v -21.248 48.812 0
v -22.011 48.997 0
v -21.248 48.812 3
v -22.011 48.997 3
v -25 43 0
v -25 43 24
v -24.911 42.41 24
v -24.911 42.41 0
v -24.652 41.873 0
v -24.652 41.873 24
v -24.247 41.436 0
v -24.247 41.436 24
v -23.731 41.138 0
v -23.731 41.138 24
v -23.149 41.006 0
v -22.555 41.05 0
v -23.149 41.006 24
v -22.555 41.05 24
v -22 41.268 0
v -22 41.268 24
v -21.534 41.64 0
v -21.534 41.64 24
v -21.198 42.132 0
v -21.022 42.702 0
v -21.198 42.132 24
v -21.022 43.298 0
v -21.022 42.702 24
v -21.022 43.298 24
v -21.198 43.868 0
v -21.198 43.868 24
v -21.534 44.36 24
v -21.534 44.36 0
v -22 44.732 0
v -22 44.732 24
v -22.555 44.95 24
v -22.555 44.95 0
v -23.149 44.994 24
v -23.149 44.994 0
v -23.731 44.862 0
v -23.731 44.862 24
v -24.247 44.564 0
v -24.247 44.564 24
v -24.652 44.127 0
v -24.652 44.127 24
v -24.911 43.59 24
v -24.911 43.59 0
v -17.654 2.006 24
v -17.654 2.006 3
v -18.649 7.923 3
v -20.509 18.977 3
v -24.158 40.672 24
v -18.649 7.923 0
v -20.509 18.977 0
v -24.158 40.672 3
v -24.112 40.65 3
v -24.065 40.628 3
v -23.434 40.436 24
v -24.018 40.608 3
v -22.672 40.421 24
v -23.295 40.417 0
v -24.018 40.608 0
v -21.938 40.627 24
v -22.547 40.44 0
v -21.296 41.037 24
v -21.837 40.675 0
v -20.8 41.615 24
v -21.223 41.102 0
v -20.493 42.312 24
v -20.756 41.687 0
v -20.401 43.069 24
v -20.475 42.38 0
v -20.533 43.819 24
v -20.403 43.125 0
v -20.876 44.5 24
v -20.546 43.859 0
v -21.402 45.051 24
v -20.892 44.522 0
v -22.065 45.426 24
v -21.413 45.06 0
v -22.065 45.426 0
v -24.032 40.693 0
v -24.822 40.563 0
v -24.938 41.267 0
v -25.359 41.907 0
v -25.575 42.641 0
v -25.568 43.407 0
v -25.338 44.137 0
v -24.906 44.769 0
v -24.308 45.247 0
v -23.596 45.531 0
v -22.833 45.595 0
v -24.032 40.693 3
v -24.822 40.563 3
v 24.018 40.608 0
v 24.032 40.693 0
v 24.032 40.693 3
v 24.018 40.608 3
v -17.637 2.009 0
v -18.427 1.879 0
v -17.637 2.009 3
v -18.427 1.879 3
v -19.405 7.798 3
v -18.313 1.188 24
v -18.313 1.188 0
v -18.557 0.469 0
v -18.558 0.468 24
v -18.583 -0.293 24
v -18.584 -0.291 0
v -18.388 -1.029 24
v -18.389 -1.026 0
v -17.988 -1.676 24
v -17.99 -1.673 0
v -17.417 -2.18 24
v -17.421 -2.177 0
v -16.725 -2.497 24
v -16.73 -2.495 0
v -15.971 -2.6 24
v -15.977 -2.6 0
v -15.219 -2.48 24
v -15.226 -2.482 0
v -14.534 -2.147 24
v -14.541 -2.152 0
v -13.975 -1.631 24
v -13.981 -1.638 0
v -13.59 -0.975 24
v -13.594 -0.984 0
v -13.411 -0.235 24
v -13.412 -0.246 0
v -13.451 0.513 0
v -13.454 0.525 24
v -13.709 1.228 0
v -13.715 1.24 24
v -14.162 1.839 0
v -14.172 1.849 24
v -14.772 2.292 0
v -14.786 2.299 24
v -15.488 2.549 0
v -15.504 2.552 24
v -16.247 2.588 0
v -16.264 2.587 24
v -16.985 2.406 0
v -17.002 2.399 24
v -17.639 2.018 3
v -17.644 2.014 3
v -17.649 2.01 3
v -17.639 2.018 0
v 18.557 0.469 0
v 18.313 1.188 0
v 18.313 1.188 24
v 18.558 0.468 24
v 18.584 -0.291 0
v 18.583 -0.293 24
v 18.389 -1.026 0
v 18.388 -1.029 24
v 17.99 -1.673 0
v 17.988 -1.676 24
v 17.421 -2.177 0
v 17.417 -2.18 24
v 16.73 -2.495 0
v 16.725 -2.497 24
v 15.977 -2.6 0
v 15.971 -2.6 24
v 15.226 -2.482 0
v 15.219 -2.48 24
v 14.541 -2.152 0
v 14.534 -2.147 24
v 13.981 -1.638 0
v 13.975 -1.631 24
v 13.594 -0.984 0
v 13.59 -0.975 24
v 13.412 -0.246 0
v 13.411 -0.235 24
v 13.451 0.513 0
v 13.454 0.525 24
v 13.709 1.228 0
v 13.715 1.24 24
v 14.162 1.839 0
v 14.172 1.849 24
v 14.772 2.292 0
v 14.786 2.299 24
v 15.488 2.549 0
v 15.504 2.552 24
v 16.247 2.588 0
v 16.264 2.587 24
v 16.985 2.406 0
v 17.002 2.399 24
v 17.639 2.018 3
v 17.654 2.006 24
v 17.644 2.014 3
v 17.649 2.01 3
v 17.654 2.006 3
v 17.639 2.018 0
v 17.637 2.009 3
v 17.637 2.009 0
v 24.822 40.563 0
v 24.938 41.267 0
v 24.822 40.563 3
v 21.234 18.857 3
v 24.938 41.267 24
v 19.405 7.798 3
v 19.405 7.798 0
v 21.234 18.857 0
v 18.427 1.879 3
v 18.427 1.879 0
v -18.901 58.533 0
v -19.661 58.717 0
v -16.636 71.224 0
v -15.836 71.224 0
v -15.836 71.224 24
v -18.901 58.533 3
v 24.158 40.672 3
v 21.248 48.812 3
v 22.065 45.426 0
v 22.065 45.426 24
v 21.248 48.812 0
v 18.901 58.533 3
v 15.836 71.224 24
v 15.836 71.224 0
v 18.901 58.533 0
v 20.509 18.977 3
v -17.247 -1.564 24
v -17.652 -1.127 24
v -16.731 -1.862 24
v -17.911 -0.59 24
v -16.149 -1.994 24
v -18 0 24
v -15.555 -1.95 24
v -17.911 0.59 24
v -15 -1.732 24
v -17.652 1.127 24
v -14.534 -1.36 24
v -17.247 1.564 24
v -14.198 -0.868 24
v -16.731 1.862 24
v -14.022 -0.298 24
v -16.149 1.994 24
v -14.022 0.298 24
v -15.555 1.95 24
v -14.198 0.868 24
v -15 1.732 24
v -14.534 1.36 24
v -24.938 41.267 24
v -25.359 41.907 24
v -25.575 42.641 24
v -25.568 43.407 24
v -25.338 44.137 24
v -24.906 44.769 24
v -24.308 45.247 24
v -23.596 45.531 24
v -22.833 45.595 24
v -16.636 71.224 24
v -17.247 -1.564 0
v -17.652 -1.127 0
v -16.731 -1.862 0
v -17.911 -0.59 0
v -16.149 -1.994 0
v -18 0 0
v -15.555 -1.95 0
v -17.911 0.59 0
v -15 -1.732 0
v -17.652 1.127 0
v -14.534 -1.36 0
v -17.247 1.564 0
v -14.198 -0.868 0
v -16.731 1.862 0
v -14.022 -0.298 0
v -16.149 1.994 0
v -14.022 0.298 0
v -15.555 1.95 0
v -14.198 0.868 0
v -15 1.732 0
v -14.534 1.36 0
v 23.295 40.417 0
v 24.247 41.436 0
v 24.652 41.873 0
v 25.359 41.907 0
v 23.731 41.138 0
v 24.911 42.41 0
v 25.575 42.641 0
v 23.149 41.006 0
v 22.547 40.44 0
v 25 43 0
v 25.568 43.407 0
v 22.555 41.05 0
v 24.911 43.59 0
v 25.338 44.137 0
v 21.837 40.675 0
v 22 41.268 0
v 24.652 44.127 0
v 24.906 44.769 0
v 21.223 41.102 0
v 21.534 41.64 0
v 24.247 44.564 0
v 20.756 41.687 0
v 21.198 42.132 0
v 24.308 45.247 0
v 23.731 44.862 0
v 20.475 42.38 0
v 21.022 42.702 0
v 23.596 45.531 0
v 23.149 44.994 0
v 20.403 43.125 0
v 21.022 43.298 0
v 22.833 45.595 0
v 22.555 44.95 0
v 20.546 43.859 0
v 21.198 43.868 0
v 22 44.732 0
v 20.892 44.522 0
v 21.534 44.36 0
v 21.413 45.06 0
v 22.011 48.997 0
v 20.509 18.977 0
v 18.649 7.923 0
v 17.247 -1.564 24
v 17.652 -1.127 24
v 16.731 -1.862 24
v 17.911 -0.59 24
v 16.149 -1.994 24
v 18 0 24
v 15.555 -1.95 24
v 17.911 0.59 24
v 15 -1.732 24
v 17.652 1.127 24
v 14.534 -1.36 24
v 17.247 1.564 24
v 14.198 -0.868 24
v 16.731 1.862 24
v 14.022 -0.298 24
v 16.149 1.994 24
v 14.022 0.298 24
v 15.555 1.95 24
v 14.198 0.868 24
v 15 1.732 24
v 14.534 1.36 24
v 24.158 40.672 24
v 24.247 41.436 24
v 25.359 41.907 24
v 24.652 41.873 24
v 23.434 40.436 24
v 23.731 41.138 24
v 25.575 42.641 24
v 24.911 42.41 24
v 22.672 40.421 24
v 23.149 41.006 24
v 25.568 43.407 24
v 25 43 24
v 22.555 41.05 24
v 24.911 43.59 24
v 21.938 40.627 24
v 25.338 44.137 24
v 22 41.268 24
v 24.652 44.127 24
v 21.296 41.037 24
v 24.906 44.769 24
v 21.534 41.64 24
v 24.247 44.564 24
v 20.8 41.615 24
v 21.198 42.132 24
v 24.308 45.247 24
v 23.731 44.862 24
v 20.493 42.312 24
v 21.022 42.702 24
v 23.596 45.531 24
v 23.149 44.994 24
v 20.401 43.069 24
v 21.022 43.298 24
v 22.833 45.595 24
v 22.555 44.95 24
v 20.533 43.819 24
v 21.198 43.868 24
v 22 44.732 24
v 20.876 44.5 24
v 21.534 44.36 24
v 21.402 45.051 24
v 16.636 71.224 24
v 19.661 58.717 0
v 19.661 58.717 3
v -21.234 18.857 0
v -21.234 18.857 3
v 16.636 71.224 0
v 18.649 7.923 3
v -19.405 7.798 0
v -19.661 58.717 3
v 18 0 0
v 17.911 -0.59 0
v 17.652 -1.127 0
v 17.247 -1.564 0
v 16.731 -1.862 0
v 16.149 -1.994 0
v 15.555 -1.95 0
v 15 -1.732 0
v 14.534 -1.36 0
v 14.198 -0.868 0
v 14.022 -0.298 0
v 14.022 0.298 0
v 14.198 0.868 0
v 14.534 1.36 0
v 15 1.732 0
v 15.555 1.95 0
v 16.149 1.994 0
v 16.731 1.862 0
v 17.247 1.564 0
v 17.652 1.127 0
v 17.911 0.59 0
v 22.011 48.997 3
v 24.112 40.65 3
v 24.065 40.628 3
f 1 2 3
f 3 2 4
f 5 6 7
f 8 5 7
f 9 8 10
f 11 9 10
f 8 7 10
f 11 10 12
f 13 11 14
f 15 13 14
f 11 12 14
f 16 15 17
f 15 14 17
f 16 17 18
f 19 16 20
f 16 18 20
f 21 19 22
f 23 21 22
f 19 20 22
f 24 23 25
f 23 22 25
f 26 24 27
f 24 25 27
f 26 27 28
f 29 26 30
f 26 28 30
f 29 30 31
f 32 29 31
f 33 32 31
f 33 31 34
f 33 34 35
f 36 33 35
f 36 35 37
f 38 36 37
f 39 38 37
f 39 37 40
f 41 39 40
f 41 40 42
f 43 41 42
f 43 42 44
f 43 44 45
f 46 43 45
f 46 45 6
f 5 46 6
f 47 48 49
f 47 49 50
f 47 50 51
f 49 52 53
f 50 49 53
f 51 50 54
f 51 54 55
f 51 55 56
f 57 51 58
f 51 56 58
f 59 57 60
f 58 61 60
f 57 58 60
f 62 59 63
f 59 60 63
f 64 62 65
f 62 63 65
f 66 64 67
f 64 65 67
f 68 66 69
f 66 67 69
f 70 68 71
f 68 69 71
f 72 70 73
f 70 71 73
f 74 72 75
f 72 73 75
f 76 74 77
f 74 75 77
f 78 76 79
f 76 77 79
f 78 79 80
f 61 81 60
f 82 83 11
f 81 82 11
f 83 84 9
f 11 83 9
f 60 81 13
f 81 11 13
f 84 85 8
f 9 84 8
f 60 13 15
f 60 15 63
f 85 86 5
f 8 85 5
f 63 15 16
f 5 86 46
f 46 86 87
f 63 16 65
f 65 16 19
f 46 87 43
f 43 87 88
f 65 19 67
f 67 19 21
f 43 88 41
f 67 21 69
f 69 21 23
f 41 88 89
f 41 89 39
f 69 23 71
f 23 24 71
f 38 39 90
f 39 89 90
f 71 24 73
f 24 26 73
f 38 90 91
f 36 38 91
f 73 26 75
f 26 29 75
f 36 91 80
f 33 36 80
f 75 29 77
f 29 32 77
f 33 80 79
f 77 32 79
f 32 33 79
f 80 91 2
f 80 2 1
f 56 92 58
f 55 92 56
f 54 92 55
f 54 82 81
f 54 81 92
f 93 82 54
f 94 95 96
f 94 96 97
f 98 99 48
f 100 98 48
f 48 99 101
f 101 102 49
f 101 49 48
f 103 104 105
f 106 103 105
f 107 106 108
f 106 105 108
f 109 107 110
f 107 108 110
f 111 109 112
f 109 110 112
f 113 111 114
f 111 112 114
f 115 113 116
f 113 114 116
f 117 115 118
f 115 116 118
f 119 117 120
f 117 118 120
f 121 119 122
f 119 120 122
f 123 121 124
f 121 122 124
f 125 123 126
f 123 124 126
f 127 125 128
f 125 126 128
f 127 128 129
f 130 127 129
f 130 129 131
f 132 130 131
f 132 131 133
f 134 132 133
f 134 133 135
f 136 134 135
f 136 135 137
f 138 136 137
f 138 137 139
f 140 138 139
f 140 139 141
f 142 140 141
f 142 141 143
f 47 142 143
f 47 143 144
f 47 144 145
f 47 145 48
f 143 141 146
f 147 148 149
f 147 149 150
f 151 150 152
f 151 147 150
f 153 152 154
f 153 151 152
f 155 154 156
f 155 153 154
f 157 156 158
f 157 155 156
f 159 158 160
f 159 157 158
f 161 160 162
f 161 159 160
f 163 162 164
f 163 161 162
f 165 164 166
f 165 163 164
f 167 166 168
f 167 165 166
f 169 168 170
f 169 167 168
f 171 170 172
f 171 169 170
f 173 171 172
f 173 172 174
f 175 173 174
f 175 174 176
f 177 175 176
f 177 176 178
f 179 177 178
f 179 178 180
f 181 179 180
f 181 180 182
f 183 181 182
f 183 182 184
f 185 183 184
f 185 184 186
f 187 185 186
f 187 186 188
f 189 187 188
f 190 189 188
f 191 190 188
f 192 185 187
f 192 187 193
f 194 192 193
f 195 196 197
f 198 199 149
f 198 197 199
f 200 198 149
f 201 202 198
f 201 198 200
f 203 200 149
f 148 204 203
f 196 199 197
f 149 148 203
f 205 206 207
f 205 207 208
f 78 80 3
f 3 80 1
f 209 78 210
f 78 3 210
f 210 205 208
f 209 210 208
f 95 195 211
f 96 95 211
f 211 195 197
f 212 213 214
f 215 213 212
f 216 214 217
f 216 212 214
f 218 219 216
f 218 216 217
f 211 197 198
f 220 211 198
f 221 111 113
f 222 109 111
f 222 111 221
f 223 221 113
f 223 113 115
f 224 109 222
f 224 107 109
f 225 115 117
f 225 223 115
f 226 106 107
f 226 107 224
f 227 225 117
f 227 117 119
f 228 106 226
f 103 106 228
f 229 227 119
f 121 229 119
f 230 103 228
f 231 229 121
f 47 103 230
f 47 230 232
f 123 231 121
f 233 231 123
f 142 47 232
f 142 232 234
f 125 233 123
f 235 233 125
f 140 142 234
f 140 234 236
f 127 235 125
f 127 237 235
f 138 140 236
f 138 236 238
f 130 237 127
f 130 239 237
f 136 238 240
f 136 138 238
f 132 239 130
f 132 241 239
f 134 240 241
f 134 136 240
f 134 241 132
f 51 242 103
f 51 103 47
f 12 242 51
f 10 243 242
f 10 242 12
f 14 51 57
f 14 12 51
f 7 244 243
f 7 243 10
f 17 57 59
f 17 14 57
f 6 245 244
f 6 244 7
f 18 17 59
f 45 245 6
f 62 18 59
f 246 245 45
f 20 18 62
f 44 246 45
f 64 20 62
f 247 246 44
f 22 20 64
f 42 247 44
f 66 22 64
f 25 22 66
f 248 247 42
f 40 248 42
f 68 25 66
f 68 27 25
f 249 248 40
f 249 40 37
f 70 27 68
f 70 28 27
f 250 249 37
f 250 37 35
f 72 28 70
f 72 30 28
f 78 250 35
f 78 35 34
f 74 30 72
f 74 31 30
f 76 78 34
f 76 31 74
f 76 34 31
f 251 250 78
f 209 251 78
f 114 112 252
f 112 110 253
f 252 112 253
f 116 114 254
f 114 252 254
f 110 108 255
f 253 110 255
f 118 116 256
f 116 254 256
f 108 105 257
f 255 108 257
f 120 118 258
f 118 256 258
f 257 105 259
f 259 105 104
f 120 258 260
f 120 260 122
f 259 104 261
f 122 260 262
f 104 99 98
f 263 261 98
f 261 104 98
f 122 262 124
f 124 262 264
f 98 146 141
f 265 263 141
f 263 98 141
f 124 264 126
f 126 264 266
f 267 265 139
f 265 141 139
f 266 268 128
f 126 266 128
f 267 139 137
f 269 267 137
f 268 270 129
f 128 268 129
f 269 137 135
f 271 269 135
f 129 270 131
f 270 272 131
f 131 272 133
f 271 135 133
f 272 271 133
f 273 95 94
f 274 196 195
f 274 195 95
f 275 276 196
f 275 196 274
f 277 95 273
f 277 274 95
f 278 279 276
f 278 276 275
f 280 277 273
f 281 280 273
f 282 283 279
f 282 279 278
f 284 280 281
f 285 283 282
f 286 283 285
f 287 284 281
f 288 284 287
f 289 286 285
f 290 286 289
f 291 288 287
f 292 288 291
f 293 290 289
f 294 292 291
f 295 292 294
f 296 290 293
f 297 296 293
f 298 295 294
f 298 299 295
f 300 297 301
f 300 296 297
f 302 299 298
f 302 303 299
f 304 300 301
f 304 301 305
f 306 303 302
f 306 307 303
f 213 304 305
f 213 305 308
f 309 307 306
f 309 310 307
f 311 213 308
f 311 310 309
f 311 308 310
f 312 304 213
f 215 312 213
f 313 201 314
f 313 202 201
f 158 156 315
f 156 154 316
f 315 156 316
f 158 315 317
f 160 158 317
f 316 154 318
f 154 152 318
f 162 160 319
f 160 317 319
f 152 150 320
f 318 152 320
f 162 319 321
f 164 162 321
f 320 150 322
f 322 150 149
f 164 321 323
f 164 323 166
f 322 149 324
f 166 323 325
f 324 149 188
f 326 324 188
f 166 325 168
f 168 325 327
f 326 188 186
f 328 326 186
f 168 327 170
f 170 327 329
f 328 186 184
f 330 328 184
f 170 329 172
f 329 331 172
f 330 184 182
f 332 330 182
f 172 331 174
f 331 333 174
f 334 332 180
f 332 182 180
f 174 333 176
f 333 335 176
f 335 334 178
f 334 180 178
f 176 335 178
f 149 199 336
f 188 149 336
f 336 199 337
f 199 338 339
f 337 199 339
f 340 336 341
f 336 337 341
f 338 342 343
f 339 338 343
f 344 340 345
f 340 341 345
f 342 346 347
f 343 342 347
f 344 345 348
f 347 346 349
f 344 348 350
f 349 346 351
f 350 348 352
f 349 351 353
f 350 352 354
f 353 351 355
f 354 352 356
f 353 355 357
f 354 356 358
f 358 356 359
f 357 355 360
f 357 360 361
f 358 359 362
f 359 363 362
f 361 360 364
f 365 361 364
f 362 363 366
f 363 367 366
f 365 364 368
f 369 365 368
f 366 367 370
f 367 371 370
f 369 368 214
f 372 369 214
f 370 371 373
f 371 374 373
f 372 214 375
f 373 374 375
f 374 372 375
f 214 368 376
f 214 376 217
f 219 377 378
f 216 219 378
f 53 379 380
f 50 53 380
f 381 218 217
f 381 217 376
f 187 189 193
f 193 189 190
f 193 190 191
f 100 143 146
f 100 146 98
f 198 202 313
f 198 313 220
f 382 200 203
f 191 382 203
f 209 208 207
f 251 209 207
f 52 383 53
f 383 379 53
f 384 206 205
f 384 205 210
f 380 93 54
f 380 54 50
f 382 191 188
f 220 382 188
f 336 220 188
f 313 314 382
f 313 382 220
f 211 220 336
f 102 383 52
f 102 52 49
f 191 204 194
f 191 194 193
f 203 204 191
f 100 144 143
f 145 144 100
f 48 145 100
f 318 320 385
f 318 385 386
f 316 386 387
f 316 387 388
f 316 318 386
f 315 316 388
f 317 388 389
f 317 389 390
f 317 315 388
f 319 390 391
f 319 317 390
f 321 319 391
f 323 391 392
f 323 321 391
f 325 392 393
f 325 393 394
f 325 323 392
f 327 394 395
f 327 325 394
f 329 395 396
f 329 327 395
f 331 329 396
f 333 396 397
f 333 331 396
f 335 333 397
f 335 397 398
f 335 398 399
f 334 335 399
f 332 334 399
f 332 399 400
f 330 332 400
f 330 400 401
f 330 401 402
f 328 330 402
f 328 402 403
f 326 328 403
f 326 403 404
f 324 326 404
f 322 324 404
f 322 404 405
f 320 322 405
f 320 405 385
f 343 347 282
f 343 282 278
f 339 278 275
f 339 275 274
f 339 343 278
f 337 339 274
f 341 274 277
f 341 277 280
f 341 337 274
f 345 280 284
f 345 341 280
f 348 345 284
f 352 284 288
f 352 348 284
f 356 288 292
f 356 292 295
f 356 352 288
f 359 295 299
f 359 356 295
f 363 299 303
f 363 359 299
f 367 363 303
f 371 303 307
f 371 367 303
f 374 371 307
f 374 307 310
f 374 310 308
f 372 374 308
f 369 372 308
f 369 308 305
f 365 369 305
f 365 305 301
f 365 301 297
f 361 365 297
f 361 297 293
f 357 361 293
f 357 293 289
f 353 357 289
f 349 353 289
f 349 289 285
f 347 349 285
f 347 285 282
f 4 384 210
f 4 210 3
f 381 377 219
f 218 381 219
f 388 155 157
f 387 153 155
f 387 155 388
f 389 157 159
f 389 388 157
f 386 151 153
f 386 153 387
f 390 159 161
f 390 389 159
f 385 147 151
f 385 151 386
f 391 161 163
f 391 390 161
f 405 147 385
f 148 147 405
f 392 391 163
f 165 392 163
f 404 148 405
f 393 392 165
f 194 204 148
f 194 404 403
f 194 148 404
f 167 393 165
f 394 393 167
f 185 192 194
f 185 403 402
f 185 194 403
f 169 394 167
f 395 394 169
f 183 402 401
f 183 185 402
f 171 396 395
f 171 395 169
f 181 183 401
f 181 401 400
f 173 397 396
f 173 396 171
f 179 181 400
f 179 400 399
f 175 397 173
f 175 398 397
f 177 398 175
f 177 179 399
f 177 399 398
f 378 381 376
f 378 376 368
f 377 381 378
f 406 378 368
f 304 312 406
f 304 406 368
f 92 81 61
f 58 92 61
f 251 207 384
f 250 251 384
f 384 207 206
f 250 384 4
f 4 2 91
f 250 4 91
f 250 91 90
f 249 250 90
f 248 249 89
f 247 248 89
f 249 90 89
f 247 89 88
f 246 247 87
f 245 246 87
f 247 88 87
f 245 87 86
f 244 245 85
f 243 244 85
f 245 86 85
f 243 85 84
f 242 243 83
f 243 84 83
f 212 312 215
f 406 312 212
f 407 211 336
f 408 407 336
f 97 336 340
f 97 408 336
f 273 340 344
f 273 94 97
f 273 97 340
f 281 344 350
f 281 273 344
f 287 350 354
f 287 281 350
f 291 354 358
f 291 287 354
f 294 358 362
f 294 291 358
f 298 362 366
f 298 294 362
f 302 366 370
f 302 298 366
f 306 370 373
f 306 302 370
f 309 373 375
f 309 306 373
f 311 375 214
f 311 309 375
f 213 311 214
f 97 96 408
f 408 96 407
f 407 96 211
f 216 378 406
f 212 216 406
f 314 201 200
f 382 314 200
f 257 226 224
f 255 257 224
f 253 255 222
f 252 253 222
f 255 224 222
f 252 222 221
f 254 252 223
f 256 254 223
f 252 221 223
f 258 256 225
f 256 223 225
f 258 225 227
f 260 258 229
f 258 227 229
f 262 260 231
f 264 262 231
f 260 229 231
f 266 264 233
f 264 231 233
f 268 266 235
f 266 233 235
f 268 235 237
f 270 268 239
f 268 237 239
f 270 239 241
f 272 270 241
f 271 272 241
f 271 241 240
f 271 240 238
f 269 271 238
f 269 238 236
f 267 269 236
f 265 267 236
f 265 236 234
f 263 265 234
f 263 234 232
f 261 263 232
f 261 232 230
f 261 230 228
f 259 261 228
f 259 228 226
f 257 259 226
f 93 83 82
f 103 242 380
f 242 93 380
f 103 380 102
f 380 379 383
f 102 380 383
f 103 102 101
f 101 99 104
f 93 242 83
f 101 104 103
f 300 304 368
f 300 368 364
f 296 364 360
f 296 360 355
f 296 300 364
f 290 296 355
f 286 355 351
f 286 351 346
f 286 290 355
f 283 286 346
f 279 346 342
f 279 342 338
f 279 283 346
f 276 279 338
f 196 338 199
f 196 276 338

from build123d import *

# Parameters (mm, degrees)
F0_R     = 2.6
F1_DEPTH = 24
F4_DEPTH = 24
F5_D     = 4
F6_W     = 22
F6_H     = 3
F6_W_2   = 6
F7_DEPTH = 0.8
F8_W     = 10
F8_H     = 3
F9_DEPTH = 2


with BuildPart() as f1:
    # F0 (on Top) → F1 (new body)
    with BuildSketch(Plane.XY):
        with Locations((-23, 43)):
            Circle(F0_R)
    extrude(amount=F1_DEPTH)



with BuildPart() as f1b:
    # F0 (on Top) → F1, piece 2 (new body)
    with BuildSketch(Plane.XY):
        with Locations((-16, 0)):
            Circle(F0_R)
    extrude(amount=F1_DEPTH)


with BuildPart() as f1_1:
    add(f1.part)

    add(f1b.part)  # F4 merges F1b
    # F3 (on Top) → F4 (join)
    with BuildSketch(Plane.XY):
        Polygon((-24.7263594471, 44.0490897611), (-25.3071562016, 43.4989305751), (-18.1161369738, 0), (-17.3161369738, 0), align=None)
        Polygon((-16.6362095624, 71.2243393064), (-23.301705718, 43.6581224203), (-22.5029374696, 43.6137457905), (-15.8362095624, 71.2243393064), align=None)
    extrude(amount=F4_DEPTH)

    # F5 (through all)
    with Locations(Plane(origin=(0, 0, 0), x_dir=(1, 0, 0), z_dir=(0, 0, -1))):
        with Locations((-23, -43), (-16, 0)):
            Hole(F5_D / 2)

    # F6 (on face) → F7 (cut)
    with BuildSketch(Plane(origin=(-17.6342116053, -2.9151970645, 0), x_dir=(0.1631011774, -0.9866093482, 0), z_dir=(-0.9866093482, -0.1631011774, 0))):
        with Locations((-33.0678777581, 1.5)):
            Rectangle(F6_W, F6_H)
        with Locations((-7.8588104236, 1.5)):
            Rectangle(F6_W_2, F6_H)
    extrude(amount=-F7_DEPTH, mode=Mode.SUBTRACT)

    # F8 (on face) → F9 (cut)
    with BuildSketch(Plane(origin=(-31.9879756421, 7.7346750027, 0), x_dir=(-0.2350264048, -0.9719889861, 0), z_dir=(-0.9719889861, 0.2350264048, 0))):
        with Locations((-47.4510434546, 1.5)):
            Rectangle(F8_W, F8_H)
    extrude(amount=-F9_DEPTH, mode=Mode.SUBTRACT)


with BuildPart() as f10_1:
    # F10: instance of F1
    add(f1_1.part.mirror(Plane.YZ))


solid = Compound([f1_1.part, f10_1.part])
